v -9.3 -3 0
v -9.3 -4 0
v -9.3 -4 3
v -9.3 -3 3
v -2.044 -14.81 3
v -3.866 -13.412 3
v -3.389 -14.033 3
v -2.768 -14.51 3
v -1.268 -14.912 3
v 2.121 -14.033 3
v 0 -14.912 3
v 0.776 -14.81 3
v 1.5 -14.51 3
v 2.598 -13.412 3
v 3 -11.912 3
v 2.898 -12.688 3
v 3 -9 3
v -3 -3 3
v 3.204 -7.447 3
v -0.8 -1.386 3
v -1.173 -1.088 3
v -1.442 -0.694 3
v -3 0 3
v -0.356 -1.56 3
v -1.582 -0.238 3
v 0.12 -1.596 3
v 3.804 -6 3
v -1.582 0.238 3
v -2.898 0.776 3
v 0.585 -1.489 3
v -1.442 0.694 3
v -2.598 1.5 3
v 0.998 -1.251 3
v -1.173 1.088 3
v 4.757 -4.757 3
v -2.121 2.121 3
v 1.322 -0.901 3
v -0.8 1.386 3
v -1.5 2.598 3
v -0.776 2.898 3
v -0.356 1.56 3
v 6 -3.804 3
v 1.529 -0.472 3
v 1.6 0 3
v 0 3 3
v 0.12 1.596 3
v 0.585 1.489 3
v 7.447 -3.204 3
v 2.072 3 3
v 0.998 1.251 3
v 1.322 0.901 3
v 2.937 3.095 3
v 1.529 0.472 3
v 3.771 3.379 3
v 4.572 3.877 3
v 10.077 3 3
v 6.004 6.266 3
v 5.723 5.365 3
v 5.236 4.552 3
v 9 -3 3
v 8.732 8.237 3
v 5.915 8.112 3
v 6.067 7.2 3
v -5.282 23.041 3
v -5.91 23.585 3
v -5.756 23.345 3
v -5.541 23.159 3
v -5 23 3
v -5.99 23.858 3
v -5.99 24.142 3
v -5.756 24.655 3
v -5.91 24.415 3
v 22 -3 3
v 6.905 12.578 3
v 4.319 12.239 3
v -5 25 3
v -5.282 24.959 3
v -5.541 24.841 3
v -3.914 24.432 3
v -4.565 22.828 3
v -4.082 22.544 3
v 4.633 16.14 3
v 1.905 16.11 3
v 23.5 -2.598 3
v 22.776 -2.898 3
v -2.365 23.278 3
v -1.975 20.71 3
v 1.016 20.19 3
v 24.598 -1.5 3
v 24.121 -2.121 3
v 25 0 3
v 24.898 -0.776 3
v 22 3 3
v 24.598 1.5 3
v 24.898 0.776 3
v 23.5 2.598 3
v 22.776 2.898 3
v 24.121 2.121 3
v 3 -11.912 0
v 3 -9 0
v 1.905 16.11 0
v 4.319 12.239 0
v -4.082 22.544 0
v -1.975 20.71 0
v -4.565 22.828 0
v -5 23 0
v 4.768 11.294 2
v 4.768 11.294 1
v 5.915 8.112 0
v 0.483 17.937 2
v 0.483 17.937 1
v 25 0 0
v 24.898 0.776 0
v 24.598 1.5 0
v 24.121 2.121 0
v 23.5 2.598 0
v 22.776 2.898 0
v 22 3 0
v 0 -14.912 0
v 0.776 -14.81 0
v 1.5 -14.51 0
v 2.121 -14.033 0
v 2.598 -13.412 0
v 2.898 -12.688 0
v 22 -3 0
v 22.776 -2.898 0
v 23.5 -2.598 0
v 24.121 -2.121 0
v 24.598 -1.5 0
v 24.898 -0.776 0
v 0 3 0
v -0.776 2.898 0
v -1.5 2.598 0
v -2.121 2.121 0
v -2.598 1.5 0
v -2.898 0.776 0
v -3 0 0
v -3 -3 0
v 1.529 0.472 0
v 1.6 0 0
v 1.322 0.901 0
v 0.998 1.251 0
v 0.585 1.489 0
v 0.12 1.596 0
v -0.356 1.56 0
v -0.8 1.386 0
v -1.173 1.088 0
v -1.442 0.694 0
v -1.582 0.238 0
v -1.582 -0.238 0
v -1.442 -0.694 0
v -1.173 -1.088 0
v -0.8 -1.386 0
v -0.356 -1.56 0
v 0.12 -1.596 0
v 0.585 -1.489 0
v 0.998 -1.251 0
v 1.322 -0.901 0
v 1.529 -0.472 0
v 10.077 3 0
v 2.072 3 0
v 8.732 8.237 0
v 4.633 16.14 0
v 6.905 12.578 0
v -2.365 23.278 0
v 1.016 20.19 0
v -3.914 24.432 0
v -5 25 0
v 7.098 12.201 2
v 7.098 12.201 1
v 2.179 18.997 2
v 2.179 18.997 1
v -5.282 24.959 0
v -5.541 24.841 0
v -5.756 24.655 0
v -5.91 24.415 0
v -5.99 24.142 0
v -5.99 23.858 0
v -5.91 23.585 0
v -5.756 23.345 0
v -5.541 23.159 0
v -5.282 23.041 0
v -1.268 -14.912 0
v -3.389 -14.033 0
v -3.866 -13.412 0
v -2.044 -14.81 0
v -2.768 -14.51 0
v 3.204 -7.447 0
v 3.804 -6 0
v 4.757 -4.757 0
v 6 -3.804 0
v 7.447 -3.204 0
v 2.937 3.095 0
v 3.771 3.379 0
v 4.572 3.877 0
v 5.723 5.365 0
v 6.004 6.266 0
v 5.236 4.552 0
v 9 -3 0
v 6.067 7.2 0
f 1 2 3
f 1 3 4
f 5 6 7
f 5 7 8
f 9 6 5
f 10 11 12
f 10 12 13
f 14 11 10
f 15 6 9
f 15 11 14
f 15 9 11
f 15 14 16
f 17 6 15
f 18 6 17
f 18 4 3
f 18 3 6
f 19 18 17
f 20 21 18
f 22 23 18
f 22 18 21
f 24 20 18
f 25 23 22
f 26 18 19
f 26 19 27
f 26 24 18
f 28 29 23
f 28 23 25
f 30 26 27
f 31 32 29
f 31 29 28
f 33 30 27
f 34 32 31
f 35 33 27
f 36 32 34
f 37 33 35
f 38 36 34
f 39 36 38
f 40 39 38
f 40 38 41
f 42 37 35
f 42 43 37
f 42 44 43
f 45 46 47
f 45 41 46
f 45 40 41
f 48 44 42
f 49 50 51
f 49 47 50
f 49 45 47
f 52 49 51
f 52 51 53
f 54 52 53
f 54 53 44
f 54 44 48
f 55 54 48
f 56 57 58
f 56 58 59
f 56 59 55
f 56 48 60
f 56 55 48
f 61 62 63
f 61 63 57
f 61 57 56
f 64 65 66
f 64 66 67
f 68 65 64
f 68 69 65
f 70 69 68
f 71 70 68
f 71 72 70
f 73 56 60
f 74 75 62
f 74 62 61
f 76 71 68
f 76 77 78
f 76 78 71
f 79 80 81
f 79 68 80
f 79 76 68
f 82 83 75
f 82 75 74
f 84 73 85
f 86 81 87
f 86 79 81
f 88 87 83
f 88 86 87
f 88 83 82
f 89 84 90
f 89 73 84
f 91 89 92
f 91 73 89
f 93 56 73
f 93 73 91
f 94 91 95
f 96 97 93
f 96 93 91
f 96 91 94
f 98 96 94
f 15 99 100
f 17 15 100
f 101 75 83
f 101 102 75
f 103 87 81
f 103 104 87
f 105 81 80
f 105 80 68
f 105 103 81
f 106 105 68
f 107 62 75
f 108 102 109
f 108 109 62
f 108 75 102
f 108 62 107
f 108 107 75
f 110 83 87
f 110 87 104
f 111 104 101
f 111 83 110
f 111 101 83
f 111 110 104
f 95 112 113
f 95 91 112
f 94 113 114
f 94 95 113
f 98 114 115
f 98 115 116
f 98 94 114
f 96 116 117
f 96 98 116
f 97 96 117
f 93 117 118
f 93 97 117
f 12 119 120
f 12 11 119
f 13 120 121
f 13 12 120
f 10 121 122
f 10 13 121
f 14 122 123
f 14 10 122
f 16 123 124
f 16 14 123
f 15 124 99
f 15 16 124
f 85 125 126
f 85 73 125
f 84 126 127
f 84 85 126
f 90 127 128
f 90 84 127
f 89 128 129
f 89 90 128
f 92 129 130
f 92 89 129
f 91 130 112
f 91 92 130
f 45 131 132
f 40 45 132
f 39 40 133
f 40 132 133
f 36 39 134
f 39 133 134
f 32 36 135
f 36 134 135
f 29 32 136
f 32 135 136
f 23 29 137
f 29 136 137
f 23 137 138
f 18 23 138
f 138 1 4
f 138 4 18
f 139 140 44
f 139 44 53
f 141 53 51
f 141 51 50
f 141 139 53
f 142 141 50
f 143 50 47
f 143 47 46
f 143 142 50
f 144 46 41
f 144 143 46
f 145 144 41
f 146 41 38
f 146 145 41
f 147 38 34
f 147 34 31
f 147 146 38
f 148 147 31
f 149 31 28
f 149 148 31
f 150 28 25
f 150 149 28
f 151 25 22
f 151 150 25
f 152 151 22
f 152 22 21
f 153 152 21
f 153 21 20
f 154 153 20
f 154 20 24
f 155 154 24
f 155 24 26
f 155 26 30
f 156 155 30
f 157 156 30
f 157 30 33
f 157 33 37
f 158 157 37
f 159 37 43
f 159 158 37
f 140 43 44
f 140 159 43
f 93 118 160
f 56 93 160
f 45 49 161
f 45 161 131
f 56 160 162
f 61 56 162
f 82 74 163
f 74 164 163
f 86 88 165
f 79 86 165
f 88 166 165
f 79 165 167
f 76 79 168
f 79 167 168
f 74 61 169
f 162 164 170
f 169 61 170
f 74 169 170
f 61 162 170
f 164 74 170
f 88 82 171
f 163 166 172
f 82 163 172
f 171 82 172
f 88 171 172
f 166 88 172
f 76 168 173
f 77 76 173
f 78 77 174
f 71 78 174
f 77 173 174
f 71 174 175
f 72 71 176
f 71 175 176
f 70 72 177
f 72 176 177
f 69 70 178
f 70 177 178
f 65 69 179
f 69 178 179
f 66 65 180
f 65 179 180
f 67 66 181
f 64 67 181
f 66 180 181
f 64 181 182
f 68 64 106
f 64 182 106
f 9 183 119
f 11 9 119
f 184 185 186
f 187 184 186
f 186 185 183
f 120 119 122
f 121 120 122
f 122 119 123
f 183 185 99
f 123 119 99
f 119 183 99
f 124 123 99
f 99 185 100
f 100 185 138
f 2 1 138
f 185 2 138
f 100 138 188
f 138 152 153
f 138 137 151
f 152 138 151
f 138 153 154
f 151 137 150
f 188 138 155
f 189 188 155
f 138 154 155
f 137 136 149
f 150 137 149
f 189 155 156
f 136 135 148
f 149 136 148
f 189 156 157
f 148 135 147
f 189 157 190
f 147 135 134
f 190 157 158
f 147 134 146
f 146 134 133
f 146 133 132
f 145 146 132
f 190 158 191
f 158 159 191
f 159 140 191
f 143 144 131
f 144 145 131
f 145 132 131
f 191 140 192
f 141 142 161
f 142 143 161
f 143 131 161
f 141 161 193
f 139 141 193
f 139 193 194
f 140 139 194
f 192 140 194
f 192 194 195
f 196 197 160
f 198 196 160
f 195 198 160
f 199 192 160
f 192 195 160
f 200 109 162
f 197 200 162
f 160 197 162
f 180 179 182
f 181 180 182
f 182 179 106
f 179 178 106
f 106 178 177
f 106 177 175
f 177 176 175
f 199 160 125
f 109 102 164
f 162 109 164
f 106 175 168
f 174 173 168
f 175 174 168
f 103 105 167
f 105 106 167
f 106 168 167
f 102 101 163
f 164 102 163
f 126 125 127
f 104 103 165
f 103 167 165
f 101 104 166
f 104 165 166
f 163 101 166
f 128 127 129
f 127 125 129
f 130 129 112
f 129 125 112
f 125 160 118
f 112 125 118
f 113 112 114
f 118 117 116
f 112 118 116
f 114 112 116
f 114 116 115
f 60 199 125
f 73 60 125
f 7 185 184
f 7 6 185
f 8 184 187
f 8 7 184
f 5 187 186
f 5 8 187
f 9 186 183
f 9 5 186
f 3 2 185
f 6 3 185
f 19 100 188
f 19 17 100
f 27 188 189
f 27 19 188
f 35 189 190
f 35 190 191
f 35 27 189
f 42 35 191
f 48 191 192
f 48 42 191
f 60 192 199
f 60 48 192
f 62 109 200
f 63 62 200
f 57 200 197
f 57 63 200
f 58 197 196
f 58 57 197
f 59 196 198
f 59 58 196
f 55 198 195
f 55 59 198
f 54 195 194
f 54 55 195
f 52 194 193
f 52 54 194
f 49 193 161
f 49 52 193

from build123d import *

# Parameters (mm, degrees)
F0_R     = 1.6
F0_W     = 6.3
F0_H     = 1
F1_DEPTH = 3
F2_R     = 2.99999
F3_R     = 6
F4_R     = 4


# Not quite as in the source:
# - a fillet or chamfer is up to 0.001 mm smaller than in the source, because OpenCascade refuses the exact size
# - a feature names something its author has since deleted; it is built from what else it names


with BuildPart() as f1:
    # F0 (on Top) → F1 (new body)
    with BuildSketch(Plane.XY):
        with BuildLine():
            ThreePointArc((0, 3), (-2.1213203436, 2.1213203436), (-3, 0))
            Line((-3, 0), (-3, -3))
            Line((-3, -3), (-3, -4))
            Line((-3, -4), (-9.3, -4))
            Line((-9.3, -4), (-3, -14.9119200877))
            Line((-3, -14.9119200877), (3, -14.9119200877))
            Line((3, -14.9119200877), (3, -3))
            Line((3, -3), (25, -3))
            Line((25, -3), (25, 3))
            Line((25, 3), (10.0770951748, 3))
            Line((10.0770951748, 3), (7.0770951748, 3))
            Line((7.0770951748, 3), (0, 3))
        make_face()
        Circle(F0_R, mode=Mode.SUBTRACT)
        with Locations((-6.15, -3.5)):
            Rectangle(F0_W, F0_H)
        with BuildLine():
            add(Edge.make_bspline(
                [(7.0770951748, 3), (6.4332614255, 6.4067024909), (5.2223697544, 11.3722601643), (1.0114116485, 17.6559878049), (-3.6425327417, 22.6266458631), (-5, 23)],
                knots=[0, 0, 0, 0, 0.3461061531, 0.6777539699, 1, 1, 1, 1], degree=3))
            Line((7.0770951748, 3), (10.0770951748, 3))
            add(Edge.make_bspline(
                [(10.0770951748, 3), (9.3764700877, 6.6524697116), (7.4550072041, 12.4304500602), (2.9271463912, 18.7046739484), (-3.554672909, 24.5379839434), (-5, 25)],
                knots=[0, 0, 0, 0, 0.3430568532, 0.6625508471, 1, 1, 1, 1], degree=3))
            ThreePointArc((-5, 25), (-6, 24), (-5, 23))
        make_face()
    extrude(amount=F1_DEPTH)

    # F2 (radius 3 in the source; OpenCascade refuses exactly that, so slightly less here)
    f2_edges = [f1.edges().sort_by_distance(p)[0] for p in [
        (-3, -14.91192, 1.5),
        (3, -14.91192, 1.5),
        (25, -3, 1.5),
        (25, 3, 1.5),
    ]]
    fillet(f2_edges, radius=F2_R)

    # F3
    f3_edges = [f1.edges().sort_by_distance(p)[0] for p in [
        (3, -3, 1.5),
    ]]
    fillet(f3_edges, radius=F3_R)

    # F4
    f4_edges = [f1.edges().sort_by_distance(p)[0] for p in [
        (7.077095, 3, 1.5),
    ]]
    fillet(f4_edges, radius=F4_R)


solid = f1.part
